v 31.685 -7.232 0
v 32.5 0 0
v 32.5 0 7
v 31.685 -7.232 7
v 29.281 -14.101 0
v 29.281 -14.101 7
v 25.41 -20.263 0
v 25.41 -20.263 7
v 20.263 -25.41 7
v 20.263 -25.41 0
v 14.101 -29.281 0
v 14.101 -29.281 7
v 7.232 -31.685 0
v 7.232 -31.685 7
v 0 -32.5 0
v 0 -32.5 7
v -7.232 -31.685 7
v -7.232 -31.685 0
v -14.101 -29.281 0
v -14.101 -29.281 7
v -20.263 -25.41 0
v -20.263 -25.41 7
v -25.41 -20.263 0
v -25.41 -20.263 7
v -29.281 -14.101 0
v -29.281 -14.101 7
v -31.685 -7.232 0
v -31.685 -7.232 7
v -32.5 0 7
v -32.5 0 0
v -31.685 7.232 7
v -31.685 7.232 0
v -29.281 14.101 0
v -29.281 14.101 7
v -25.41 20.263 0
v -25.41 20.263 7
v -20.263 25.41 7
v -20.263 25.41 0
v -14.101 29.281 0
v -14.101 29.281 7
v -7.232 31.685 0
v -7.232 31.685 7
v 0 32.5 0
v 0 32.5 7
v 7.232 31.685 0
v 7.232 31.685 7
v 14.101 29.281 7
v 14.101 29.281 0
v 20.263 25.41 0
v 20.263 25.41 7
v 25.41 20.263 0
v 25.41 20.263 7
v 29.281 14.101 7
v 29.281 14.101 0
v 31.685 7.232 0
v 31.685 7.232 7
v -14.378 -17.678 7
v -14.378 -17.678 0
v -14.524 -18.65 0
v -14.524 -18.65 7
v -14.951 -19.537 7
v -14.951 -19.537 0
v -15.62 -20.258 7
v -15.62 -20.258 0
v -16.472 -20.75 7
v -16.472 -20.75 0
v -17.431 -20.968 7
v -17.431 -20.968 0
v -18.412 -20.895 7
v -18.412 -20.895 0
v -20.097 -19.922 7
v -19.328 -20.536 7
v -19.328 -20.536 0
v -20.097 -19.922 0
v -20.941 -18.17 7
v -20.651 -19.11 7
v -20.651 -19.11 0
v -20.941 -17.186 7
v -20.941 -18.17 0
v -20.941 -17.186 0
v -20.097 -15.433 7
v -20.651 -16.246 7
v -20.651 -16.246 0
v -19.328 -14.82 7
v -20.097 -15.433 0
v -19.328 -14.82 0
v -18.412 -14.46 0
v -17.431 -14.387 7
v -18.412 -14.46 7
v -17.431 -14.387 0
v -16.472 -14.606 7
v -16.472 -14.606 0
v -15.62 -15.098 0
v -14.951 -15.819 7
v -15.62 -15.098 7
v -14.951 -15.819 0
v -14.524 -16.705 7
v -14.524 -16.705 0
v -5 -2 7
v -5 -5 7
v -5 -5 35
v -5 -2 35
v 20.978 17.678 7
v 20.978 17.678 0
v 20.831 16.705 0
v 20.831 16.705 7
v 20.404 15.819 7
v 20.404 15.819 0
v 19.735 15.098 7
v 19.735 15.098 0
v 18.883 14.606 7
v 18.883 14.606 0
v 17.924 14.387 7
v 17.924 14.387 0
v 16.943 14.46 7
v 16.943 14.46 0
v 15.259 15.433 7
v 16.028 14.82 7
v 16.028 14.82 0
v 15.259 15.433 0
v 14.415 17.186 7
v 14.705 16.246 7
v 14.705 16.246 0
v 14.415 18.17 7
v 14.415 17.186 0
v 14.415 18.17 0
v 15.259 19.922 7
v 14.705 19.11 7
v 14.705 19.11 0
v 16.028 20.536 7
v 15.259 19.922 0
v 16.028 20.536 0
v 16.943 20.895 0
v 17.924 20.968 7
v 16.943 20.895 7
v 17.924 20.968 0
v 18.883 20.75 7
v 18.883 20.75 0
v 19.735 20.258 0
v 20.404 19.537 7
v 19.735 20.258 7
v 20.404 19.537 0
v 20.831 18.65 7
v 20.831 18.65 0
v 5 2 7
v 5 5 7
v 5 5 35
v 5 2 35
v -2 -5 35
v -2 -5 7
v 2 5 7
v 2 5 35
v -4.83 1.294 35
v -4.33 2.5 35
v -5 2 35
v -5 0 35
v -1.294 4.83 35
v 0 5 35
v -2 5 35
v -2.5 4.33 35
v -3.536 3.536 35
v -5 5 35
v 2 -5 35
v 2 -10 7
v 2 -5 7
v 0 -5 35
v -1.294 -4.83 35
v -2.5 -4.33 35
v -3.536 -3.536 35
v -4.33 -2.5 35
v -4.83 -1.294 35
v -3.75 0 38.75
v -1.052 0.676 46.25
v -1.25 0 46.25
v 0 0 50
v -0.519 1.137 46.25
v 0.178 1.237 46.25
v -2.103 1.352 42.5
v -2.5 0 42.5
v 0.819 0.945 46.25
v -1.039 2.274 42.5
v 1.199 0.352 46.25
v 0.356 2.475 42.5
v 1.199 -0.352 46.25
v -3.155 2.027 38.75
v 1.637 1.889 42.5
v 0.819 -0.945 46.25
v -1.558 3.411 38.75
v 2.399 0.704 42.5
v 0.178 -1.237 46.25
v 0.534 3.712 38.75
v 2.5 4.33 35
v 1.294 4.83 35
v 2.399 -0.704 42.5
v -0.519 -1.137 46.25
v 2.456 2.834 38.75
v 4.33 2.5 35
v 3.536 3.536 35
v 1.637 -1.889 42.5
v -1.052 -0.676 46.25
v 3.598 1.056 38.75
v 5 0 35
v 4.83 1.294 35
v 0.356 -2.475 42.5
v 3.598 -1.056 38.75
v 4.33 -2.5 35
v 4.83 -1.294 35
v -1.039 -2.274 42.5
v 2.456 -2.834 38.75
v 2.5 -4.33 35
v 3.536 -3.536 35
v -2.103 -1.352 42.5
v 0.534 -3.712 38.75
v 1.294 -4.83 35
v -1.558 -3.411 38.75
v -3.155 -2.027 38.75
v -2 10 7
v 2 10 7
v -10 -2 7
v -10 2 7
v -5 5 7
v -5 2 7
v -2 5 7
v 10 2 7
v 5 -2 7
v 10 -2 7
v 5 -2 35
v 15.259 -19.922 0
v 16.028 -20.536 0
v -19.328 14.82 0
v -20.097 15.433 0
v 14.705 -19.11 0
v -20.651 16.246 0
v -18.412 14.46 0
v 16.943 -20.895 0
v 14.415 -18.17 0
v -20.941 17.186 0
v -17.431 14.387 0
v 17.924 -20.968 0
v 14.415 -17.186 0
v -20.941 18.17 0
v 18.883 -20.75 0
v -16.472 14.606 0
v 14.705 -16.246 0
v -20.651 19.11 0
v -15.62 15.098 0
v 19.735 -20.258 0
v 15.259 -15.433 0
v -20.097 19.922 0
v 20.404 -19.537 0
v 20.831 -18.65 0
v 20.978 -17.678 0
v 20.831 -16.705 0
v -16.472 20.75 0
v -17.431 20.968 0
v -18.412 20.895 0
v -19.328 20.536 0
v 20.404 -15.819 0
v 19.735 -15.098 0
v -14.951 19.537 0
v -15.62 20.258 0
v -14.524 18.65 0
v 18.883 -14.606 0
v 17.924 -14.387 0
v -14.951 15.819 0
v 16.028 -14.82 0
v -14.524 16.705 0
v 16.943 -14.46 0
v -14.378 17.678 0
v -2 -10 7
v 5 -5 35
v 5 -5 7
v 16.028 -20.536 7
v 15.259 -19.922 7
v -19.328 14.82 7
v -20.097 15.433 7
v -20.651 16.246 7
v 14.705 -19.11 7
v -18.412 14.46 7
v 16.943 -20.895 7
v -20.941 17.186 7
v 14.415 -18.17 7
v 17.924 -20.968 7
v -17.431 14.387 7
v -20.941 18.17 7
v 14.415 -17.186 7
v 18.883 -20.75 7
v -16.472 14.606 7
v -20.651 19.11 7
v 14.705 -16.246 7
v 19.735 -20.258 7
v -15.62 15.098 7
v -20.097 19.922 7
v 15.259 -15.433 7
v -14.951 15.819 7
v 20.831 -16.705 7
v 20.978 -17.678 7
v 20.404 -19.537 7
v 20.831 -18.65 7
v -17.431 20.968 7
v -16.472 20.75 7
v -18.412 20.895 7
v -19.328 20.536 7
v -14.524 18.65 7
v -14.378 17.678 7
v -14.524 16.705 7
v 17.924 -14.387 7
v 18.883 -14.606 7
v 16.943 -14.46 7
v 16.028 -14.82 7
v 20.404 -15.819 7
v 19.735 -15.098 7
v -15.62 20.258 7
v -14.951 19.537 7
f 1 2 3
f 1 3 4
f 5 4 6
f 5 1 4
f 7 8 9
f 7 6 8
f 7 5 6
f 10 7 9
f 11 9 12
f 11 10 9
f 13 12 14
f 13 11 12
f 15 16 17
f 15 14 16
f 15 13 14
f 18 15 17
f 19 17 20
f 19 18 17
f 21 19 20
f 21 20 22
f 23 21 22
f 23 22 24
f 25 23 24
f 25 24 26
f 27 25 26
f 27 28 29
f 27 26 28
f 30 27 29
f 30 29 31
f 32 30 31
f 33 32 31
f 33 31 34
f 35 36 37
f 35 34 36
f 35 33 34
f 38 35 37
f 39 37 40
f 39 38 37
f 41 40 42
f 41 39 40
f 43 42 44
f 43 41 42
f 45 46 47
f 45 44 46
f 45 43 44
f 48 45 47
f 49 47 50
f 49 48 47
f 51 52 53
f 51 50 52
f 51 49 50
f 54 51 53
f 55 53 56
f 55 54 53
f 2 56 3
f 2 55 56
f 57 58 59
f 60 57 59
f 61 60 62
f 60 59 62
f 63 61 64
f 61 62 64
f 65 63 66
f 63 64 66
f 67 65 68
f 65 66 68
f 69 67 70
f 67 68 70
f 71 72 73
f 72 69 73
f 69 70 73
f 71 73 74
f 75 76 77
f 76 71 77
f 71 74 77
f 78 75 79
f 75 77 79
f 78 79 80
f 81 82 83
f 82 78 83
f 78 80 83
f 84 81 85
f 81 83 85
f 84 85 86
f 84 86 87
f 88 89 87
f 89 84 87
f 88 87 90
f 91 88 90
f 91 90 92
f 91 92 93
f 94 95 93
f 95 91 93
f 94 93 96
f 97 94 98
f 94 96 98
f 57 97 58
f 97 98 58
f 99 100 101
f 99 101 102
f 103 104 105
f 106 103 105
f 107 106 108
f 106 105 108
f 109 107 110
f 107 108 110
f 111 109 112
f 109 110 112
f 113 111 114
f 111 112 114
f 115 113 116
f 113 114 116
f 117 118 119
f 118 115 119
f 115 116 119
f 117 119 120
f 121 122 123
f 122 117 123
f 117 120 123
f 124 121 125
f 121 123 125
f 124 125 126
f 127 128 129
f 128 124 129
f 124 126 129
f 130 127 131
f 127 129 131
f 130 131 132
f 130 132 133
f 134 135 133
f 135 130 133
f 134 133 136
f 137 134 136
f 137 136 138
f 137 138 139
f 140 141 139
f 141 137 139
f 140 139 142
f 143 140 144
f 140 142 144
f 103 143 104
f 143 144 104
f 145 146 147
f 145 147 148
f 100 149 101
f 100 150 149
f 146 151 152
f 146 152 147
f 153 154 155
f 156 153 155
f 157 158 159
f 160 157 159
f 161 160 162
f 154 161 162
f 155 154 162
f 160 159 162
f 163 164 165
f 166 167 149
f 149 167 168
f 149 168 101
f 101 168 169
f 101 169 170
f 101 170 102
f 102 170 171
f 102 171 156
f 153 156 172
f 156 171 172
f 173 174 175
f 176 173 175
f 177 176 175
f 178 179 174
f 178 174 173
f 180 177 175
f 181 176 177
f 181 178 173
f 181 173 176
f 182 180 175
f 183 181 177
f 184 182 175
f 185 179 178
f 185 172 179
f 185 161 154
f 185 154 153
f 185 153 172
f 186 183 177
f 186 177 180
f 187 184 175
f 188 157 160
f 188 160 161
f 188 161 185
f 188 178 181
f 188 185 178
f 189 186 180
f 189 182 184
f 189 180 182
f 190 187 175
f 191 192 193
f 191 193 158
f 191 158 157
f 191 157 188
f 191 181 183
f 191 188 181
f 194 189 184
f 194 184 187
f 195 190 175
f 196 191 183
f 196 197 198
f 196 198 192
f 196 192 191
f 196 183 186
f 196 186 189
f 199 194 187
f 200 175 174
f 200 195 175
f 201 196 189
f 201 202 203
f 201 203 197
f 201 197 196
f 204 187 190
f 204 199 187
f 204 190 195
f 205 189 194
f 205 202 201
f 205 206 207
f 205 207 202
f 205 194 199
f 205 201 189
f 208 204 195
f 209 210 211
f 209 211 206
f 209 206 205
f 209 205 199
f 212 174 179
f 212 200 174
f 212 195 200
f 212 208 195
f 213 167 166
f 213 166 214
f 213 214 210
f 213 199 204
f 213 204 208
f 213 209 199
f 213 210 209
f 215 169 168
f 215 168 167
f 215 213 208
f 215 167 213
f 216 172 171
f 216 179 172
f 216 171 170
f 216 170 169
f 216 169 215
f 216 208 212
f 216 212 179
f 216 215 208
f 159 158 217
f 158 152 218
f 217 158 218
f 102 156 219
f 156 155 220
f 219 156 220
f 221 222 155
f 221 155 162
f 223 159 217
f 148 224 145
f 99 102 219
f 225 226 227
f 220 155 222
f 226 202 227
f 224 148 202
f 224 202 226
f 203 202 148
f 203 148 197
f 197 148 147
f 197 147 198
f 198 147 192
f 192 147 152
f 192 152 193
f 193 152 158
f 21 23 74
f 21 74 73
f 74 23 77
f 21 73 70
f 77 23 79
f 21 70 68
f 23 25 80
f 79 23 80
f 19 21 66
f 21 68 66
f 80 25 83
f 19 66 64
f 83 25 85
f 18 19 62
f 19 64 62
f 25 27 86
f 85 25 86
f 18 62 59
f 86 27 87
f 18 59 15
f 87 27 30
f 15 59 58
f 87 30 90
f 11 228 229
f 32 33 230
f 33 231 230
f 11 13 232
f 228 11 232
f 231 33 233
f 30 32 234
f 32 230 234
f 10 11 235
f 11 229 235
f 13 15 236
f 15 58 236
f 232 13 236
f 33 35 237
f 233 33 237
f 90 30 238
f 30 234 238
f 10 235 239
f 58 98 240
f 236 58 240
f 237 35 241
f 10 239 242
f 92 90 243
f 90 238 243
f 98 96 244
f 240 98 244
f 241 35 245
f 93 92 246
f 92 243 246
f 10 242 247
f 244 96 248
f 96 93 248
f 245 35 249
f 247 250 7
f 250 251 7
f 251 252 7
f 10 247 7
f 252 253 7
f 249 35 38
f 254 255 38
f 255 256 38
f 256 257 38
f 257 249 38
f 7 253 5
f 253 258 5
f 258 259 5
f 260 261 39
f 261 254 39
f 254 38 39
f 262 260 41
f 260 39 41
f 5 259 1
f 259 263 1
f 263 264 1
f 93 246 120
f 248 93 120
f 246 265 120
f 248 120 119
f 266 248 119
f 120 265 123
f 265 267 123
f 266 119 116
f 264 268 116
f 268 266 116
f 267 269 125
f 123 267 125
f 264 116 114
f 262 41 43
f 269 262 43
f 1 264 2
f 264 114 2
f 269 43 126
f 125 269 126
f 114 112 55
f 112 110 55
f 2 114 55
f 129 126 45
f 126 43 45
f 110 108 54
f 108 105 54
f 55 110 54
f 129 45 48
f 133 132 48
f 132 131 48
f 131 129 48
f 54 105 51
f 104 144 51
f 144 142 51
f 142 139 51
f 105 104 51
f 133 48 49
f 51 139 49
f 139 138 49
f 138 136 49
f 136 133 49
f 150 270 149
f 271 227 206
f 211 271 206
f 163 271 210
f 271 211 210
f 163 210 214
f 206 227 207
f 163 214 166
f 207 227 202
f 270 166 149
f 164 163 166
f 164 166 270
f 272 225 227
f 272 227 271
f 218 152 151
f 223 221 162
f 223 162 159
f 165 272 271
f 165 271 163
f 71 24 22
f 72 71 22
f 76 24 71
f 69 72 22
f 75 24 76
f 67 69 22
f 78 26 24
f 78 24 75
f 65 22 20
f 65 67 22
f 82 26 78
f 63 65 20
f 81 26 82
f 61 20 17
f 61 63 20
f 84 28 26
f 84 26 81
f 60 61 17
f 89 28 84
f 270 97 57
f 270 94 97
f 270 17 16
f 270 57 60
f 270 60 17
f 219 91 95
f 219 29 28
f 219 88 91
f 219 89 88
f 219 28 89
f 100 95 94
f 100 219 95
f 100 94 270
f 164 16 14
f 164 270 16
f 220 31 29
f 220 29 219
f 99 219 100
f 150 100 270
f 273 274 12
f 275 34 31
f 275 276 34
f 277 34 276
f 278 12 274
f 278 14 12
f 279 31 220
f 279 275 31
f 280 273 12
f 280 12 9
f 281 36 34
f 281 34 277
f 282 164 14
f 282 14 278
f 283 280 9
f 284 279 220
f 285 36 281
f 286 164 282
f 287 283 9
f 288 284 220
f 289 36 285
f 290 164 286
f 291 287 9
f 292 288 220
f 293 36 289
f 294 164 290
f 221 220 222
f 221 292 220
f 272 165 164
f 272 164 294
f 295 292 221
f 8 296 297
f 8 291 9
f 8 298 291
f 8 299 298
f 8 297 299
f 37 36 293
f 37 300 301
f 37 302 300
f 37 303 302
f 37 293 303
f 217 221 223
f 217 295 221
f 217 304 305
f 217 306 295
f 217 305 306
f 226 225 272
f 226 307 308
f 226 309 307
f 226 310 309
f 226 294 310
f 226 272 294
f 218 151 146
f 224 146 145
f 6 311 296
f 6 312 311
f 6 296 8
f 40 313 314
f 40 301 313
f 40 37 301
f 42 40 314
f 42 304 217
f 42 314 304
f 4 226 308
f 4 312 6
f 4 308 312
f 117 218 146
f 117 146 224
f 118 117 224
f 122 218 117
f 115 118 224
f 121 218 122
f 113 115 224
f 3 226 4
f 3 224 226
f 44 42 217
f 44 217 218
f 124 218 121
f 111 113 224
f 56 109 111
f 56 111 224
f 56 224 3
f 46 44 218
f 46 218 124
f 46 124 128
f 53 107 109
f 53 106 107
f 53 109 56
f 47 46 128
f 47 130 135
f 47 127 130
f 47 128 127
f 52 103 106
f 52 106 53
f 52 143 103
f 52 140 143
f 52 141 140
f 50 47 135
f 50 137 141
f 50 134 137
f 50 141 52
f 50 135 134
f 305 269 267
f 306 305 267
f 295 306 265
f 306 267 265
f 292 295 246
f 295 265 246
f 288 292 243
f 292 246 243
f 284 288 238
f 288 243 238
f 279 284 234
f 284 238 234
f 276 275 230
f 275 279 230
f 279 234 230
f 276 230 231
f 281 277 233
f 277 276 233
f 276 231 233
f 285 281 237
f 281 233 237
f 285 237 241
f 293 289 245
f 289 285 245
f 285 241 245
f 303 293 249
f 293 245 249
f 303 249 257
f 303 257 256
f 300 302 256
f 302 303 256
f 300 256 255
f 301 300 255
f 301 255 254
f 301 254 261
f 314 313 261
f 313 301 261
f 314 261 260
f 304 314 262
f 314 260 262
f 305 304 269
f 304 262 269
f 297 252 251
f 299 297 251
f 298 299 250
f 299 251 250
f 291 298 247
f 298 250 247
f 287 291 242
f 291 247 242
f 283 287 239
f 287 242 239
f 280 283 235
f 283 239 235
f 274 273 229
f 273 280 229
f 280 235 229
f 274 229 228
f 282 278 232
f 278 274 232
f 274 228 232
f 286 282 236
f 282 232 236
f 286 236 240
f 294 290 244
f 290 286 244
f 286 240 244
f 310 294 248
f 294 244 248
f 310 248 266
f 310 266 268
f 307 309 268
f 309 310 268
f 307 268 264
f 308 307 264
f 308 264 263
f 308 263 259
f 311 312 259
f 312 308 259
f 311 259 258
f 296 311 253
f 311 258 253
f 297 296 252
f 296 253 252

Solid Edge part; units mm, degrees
sketch "Sketch1" plane through (0, 0, 0) normal (0, 0, 1) x (1, 0, 0)
  circle A0 centre (0, 0) radius 32.5
  circle A1 centre (-17.6777, 17.6777) radius 3.3
  circle A2 centre (17.6777, 17.6777) radius 3.3
  circle A3 centre (17.6777, -17.6777) radius 3.3
  circle A4 centre (-17.6777, -17.6777) radius 3.3
  dimension "D1" = 65
  dimension "D2" = 50
  dimension "D3" = 6.6
extrude "Protrusion1" add sketch "Sketch1" along normal blind 7
sketch "Sketch2" plane through (0, 0, 7) normal (0, 0, 1) x (1, 0, 0)
  line L0 (-5, 5) -> (5, 5)
  line L1 (5, 5) -> (5, -5)
  line L2 (5, -5) -> (-5, -5)
  line L3 (-5, -5) -> (-5, 5)
  dimension "D1" = 10
extrude "ExtrudedProtrusion_9" add sketch "Sketch2" along normal blind 28
sketch "Sketch3" plane through (0, 0, 0) normal (-1, 0, 0) x (0, -1, 0)
  line L0 (-5, 35) -> (-10, 7)
  line L1 (-10, 7) -> (-5, 7)
  line L2 (-5, 7) -> (-5, 35)
  line L3 (5, 35) -> (10, 7)
  line L4 (10, 7) -> (5, 7)
  line L5 (5, 7) -> (5, 35)
  dimension "D1" = 5
extrude "ExtrudedProtrusion_10" add sketch "Sketch3" along normal mid plane 4
sketch "Sketch4" plane through (0, 0, 0) normal (0, -1, 0) x (1, 0, 0)
  line L0 (-5, 35) -> (-10, 7)
  line L1 (-10, 7) -> (-5, 7)
  line L2 (-5, 7) -> (-5, 35)
  line L3 (5, 35) -> (10, 7)
  line L4 (10, 7) -> (5, 7)
  line L5 (5, 7) -> (5, 35)
  dimension "D1" = 5
extrude "ExtrudedProtrusion_11" add sketch "Sketch4" along normal mid plane 4
sketch "Sketch5" plane through (0, 0, 0) normal (0, -1, 0) x (1, 0, 0)
  line L0 (0, 50) -> (-5, 35)
  line L1 (-5, 35) -> (0, 35)
  dimension "D1" = 50
revolve "RevolvedProtrusion1" add sketch "Sketch5" angle 360 about axis through (0, 0, 35) along (0, 0, 1)
